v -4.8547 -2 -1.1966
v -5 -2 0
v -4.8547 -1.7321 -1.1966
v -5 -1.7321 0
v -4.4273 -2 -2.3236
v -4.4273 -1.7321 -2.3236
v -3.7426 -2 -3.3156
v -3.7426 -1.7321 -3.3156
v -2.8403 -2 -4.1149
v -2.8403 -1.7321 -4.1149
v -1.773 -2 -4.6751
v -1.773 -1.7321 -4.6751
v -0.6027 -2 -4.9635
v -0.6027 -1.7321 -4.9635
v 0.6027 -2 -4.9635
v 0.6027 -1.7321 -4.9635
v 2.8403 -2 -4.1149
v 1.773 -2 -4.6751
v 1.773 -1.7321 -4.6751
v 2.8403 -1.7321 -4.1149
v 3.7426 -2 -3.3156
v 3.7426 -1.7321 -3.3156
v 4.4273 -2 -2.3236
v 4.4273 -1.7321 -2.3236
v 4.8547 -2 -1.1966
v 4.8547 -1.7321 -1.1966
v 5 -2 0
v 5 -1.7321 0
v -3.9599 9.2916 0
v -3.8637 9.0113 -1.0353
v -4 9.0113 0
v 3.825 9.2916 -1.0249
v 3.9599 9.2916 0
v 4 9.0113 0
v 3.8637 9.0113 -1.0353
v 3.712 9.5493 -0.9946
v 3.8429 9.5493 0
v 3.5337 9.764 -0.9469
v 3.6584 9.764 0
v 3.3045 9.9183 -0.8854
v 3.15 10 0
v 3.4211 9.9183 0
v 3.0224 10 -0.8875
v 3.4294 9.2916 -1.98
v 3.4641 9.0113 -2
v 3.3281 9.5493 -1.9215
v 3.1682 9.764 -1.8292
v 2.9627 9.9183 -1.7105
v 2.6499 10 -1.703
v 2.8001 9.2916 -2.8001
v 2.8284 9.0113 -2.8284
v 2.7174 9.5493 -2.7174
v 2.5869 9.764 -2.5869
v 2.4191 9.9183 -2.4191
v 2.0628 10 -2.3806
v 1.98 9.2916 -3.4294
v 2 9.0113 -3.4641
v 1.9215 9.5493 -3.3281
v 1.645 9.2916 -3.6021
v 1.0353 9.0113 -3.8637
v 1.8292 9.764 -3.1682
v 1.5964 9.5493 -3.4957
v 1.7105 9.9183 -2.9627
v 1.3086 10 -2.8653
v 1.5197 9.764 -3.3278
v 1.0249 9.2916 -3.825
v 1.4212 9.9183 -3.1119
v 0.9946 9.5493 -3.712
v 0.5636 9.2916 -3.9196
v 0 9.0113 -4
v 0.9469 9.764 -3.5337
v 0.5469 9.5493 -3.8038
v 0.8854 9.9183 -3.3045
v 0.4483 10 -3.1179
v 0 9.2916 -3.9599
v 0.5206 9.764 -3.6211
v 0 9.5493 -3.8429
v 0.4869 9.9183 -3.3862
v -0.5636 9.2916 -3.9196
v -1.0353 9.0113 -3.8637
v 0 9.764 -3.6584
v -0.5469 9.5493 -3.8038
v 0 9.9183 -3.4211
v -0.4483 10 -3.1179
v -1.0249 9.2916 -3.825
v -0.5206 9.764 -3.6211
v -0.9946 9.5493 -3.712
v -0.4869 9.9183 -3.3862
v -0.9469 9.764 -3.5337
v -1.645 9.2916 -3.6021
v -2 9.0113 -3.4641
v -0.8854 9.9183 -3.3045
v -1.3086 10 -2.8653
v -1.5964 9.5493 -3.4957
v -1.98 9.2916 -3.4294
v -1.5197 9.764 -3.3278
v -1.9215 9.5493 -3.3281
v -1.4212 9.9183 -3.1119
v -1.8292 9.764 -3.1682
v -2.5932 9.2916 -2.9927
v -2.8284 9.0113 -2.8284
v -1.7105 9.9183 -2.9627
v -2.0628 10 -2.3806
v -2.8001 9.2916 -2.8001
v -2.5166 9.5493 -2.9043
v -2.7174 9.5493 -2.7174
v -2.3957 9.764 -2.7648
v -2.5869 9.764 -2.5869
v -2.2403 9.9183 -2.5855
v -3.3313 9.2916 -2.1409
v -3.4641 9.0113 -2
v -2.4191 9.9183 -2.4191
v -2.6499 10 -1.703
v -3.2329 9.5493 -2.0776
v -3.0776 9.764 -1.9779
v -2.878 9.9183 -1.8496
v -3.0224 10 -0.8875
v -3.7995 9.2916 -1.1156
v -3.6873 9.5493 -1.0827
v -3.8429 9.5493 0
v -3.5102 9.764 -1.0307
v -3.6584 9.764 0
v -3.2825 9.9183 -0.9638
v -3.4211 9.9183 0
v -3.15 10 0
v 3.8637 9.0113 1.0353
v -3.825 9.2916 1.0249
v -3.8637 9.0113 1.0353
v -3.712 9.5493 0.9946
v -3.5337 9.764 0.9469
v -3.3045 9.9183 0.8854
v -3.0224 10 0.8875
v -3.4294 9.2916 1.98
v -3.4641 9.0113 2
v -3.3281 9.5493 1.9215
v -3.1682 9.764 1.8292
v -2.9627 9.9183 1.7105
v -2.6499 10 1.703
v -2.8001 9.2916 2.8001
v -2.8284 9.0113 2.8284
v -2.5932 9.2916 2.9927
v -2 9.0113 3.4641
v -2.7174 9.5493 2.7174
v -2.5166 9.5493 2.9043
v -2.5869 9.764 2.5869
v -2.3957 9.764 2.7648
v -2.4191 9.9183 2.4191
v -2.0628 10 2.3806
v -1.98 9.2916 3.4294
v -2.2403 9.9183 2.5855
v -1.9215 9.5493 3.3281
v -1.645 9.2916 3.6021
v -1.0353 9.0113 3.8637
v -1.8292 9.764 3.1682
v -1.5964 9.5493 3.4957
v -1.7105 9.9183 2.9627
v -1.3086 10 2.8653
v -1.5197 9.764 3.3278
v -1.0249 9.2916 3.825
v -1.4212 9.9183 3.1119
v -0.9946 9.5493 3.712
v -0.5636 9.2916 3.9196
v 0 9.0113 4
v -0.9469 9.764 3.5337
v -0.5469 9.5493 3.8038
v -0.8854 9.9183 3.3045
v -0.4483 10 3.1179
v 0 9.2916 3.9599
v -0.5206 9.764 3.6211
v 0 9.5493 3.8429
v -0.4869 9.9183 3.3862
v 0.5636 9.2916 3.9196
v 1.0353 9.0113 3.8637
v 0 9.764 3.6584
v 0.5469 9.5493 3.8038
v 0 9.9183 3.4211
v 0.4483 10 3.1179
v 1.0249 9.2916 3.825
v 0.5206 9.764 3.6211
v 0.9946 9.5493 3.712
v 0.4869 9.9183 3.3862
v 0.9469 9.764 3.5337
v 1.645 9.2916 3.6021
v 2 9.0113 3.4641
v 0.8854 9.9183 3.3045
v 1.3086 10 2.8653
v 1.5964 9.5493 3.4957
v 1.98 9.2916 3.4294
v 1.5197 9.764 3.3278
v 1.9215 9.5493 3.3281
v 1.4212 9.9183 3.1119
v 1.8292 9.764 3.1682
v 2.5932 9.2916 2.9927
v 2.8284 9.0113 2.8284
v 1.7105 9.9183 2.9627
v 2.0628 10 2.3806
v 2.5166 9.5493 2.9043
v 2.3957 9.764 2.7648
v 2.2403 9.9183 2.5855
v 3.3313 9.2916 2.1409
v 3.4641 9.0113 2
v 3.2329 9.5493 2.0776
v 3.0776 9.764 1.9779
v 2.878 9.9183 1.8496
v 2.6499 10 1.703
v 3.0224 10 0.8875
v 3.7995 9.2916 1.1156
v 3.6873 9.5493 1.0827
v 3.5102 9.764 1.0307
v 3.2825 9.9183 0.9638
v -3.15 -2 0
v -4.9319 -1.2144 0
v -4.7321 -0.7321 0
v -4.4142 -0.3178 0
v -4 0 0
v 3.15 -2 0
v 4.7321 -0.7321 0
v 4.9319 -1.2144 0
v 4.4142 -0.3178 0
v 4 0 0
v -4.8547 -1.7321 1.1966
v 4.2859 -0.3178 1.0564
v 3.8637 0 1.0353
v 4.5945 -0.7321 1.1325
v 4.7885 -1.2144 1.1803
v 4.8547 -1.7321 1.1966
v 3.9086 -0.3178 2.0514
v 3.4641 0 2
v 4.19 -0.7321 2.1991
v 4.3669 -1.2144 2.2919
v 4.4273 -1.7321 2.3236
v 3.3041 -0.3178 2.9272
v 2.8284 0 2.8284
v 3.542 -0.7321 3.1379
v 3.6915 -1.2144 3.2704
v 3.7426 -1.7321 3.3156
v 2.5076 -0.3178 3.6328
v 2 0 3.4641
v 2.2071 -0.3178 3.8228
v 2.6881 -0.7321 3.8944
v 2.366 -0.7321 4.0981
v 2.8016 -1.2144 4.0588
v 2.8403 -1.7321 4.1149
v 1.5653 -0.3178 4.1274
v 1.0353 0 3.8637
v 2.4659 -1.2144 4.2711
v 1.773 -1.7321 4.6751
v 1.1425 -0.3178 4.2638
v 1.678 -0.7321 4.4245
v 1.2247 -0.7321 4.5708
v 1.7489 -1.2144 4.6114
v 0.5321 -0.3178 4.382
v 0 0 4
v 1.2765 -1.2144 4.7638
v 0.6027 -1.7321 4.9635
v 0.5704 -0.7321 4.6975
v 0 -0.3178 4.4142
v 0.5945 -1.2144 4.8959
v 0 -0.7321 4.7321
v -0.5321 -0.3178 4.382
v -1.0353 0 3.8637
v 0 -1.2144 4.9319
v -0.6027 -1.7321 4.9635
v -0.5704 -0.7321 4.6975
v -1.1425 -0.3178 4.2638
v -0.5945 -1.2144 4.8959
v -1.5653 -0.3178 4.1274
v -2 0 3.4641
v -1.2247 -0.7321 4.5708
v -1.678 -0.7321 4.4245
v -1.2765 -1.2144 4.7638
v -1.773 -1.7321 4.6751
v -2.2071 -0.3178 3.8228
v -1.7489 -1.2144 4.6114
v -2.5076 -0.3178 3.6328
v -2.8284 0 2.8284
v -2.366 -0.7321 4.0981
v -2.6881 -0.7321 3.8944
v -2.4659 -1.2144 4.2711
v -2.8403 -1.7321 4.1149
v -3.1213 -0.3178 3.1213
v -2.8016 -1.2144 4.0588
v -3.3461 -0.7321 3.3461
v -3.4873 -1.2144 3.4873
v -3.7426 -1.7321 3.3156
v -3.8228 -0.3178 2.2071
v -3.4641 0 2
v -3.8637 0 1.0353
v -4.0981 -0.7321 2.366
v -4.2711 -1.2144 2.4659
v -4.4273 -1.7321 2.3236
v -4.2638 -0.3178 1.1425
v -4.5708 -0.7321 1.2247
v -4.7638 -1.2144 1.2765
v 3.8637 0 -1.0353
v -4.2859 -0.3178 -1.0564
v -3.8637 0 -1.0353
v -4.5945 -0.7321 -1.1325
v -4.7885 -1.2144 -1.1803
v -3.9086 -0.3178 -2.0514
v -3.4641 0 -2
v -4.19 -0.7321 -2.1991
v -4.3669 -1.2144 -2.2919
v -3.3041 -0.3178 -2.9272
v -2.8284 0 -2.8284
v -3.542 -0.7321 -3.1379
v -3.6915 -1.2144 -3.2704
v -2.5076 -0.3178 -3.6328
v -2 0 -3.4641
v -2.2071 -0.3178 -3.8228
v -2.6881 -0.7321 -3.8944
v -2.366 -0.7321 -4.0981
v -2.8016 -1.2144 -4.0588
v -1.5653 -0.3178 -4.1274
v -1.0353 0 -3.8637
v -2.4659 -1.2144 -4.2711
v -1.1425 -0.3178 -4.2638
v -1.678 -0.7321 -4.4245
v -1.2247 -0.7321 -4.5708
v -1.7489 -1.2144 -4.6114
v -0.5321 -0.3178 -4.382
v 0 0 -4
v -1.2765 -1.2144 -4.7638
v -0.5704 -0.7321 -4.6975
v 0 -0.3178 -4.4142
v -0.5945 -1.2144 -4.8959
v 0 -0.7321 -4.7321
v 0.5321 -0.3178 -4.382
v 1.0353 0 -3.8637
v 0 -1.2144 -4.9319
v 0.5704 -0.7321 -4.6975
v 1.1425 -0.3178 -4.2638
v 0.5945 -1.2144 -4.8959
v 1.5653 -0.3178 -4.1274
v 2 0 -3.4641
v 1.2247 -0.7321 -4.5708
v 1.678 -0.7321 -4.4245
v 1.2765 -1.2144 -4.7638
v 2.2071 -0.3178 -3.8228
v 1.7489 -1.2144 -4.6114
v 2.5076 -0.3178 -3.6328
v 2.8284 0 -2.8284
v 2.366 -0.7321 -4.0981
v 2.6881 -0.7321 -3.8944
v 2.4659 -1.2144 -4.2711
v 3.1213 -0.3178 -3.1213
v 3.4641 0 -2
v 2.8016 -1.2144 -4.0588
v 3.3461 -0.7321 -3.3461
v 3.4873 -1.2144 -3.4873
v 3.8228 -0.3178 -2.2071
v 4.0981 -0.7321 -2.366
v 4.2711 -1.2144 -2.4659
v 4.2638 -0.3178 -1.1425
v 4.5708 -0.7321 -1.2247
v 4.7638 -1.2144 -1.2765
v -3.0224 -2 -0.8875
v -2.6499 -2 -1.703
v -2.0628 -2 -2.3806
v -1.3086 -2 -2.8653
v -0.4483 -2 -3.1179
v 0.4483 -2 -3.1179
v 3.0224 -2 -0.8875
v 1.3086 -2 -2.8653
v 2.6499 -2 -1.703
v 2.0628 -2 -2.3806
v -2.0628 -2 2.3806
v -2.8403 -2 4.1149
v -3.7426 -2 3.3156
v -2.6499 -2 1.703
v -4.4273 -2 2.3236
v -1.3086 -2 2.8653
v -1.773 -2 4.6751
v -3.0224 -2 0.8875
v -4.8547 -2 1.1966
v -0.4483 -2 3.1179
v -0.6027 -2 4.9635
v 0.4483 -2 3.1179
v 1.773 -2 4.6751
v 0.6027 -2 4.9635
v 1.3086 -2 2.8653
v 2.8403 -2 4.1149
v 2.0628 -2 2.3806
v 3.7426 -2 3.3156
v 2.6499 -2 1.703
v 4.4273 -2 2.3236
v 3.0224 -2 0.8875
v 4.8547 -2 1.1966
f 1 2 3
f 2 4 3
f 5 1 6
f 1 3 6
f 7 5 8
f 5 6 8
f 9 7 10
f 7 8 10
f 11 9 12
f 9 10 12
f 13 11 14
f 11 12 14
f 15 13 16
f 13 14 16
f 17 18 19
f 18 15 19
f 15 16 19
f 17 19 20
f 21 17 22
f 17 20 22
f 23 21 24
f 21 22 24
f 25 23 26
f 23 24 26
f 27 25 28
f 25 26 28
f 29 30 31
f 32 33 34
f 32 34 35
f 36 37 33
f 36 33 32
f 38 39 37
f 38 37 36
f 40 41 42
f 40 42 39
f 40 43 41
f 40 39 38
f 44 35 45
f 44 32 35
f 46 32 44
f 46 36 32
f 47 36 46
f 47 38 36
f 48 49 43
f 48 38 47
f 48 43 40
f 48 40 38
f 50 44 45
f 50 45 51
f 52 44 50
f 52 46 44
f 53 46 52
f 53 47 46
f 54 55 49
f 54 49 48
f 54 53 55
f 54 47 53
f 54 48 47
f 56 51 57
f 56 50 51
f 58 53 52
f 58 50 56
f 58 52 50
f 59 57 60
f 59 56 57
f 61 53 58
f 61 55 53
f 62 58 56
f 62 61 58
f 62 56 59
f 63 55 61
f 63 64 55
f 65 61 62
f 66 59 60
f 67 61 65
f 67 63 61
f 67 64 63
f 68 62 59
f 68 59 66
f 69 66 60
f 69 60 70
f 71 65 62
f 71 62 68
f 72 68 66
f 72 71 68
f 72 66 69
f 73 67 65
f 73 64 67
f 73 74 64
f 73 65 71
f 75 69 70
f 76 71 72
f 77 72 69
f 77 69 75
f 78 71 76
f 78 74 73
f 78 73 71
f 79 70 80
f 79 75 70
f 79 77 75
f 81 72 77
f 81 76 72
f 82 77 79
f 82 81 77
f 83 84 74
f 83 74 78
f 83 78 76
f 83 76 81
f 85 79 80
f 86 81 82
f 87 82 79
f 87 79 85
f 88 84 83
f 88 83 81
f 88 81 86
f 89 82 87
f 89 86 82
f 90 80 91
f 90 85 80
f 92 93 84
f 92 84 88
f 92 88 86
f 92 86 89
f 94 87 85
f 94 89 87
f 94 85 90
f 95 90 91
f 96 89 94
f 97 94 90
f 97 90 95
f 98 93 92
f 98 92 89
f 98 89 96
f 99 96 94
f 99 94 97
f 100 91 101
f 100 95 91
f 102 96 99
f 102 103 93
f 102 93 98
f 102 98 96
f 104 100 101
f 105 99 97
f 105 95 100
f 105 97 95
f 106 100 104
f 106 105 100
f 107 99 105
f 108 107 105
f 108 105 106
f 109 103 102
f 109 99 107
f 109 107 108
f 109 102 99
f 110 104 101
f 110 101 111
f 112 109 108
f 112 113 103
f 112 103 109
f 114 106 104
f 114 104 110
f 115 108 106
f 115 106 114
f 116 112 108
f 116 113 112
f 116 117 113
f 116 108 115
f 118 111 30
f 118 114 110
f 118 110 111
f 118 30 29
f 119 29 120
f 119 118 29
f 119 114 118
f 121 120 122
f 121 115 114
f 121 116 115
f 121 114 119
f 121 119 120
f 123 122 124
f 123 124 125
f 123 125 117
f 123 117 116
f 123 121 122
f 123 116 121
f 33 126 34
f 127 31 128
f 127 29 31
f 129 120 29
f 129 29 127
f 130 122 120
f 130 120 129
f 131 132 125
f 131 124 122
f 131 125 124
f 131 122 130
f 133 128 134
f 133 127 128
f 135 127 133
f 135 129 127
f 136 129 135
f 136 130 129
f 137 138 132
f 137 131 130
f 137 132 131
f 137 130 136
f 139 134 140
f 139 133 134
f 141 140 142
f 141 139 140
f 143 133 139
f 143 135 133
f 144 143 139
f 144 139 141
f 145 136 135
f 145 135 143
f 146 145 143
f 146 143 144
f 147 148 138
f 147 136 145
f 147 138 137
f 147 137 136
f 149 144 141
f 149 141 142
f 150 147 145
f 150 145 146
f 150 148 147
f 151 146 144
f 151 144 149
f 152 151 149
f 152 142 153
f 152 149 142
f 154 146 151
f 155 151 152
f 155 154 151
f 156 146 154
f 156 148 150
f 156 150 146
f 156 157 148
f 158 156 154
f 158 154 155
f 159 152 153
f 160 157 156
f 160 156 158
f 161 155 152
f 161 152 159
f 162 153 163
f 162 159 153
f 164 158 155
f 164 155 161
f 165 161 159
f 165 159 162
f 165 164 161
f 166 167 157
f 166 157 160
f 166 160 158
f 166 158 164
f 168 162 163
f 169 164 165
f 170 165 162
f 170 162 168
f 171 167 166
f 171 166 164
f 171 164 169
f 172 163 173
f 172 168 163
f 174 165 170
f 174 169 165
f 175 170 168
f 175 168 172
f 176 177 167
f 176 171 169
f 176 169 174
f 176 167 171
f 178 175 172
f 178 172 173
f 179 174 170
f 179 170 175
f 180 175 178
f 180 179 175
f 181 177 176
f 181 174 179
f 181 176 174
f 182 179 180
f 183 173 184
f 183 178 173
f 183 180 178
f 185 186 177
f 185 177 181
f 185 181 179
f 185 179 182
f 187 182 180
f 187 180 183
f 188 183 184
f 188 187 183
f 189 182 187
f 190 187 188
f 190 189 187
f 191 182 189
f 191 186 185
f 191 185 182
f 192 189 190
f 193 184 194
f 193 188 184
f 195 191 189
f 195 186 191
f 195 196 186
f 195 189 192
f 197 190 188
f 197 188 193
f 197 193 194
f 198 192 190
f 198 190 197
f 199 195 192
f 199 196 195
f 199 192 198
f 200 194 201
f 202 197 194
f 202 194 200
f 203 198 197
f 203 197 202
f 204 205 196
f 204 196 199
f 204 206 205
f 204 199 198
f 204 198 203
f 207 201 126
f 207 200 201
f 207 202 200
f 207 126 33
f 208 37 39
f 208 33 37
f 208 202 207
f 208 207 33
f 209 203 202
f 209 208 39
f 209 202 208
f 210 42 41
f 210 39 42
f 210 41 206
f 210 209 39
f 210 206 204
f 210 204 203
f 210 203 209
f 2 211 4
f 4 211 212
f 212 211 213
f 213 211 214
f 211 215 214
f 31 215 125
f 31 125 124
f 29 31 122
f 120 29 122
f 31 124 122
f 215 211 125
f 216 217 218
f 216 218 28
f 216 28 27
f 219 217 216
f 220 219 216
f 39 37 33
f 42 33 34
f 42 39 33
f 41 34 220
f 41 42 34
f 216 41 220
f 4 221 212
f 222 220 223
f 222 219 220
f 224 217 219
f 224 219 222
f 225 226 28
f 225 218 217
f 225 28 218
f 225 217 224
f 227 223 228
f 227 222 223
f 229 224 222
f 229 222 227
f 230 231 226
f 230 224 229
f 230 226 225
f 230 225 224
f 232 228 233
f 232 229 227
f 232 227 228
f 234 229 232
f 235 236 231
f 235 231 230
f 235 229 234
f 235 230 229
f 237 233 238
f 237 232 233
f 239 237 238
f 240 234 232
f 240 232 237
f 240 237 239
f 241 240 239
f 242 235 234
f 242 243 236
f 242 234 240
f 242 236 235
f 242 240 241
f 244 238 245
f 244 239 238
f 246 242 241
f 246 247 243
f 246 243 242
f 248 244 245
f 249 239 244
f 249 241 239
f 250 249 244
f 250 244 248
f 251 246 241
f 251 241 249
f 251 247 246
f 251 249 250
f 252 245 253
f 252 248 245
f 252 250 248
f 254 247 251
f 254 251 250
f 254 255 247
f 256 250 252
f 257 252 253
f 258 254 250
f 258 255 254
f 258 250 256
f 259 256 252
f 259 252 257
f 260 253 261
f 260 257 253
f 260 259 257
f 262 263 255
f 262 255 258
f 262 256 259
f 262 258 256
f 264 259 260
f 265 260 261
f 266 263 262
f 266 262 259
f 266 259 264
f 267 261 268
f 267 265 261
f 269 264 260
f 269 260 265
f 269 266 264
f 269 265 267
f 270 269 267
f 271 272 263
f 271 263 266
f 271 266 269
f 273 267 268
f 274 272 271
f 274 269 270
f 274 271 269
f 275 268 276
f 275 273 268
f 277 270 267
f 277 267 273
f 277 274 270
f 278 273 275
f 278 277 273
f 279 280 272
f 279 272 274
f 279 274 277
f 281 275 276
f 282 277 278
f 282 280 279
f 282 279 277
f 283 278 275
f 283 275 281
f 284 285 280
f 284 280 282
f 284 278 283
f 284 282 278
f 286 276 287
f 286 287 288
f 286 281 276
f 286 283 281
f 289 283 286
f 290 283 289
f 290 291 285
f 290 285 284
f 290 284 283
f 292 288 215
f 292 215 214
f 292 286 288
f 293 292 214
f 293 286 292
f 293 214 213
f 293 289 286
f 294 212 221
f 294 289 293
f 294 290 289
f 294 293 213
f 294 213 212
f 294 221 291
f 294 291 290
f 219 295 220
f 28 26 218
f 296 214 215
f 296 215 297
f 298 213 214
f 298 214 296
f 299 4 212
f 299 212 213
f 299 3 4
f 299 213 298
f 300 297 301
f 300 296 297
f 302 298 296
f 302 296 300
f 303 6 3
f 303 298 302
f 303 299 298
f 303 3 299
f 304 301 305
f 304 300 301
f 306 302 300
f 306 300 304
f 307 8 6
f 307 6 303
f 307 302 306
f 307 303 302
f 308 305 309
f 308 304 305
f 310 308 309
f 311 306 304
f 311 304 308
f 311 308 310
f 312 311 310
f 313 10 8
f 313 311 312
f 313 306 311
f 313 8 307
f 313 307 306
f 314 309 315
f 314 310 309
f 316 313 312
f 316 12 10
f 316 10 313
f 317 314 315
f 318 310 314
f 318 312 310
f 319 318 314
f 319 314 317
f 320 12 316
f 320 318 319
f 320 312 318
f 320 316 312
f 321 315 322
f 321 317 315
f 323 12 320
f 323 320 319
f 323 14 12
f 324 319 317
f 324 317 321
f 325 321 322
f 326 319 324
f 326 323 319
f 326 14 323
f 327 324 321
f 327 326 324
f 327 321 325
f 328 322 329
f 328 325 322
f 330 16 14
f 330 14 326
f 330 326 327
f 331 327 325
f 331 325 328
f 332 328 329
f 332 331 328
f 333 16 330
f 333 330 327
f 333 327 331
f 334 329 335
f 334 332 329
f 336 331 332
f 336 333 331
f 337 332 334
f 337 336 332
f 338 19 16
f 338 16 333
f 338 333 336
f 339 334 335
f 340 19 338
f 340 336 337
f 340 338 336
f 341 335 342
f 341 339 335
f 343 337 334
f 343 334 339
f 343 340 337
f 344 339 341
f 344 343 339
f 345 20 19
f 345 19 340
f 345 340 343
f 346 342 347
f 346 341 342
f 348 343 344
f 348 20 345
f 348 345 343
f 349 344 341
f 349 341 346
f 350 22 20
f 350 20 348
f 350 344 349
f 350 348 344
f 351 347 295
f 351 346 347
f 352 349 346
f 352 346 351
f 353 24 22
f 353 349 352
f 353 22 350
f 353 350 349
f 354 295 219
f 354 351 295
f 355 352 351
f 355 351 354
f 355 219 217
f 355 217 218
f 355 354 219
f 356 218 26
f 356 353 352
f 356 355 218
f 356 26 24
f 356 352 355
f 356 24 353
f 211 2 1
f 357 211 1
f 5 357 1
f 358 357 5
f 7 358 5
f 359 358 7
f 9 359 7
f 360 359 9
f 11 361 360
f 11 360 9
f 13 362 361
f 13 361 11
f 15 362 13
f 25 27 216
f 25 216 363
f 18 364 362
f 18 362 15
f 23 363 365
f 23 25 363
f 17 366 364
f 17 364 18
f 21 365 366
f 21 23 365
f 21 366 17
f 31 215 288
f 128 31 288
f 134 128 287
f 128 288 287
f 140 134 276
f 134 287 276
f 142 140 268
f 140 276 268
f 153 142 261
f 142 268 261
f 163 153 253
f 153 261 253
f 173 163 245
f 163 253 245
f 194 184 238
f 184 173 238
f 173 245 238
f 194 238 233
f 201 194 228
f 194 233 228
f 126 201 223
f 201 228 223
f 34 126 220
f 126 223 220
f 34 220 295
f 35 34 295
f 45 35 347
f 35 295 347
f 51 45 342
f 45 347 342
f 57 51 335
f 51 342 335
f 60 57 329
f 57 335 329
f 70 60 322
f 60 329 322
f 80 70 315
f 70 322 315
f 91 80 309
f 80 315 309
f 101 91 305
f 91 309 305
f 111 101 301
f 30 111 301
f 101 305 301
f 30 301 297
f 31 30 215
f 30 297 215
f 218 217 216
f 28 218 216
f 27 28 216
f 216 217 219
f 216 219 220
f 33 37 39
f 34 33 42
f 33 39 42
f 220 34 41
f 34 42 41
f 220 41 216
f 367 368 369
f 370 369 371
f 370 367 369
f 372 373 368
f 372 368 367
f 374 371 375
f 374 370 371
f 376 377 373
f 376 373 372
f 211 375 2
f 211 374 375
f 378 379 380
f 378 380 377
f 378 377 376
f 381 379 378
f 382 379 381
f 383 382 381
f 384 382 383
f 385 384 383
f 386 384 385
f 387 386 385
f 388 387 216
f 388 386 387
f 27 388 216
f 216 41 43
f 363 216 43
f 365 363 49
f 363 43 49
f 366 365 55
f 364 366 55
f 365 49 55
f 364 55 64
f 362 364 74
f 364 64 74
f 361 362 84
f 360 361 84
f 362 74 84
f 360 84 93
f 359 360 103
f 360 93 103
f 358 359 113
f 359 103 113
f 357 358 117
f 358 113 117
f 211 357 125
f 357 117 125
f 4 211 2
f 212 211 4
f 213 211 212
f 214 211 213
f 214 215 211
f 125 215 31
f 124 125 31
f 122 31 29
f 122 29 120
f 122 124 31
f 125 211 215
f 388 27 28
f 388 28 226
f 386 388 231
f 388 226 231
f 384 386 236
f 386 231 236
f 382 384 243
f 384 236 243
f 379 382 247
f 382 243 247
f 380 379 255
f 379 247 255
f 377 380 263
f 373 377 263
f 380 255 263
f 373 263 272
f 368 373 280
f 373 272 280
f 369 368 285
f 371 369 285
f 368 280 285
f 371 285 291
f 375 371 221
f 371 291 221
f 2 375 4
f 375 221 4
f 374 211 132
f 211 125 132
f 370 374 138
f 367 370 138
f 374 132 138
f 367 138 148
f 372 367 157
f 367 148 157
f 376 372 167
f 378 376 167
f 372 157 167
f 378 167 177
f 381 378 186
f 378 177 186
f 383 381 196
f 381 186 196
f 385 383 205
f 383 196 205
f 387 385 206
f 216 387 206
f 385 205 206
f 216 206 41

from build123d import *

# Parameters (mm, degrees)
SKETCH1_R              = 4
BOSS_EXTRUDE1_DEPTH    = 10
SKETCH6_R              = 5
BOSS_EXTRUDE2_DEPTH    = 2
SKETCH8_R              = 3.15
CUT_EXTRUDE2_DEPTH     = 14.928388277
FILLET1_R              = 2
FILLET2_R              = 1
SPLIT2_SURFACE_1_BACK  = 19.547
SPLIT2_SURFACE_1_DEPTH = 39.094
SPLIT2_SURFACE_2_BACK  = 19.547
SPLIT2_SURFACE_2_DEPTH = 39.094


with BuildPart() as part:
    # Sketch1 → Boss-Extrude1 (new body)
    with BuildSketch(Plane(origin=(0, 0, 0), x_dir=(1, 0, 0), z_dir=(0, 1, 0))):
        with Locations(Location((0, 0, 0), (0, 0, 270))):
            Circle(SKETCH1_R)
    extrude(amount=BOSS_EXTRUDE1_DEPTH)

    # Sketch6 → Boss-Extrude2 (add)
    with BuildSketch(Plane.XZ):
        with Locations(Location((0, 0, 0), (0, 0, 270))):
            Circle(SKETCH6_R)
    extrude(amount=BOSS_EXTRUDE2_DEPTH)

    # Sketch8 → Cut-Extrude2 (cut, through all)
    with BuildSketch(Plane(origin=(0, 10, 0), x_dir=(1, 0, 0), z_dir=(0, 1, 0))):
        with Locations(Location((0, 0, 0), (0, 0, 270))):
            Circle(SKETCH8_R)
    extrude(amount=-CUT_EXTRUDE2_DEPTH, mode=Mode.SUBTRACT)

    # Fillet1
    # the kernel refuses this fillet: 2 mm, written as the material it takes off along each edge
    with BuildSketch(Plane(origin=(0, 0, 0), x_dir=(0, 0, -1), z_dir=(-1, 0, 0))) as fillet1_piece_1:
        with BuildLine():
            CenterArc((3, 1.732050808), FILLET1_R, 300, 60)
            Line((4, 0), (4.02, -0.034641016))
            ThreePointArc((4.02, -0.034641016), (4.5, -0.04), (5, -0.04))
            Line((5, -0.04), (5.04, 0))
            Line((5.04, 0), (5.04, 1.732050808))
            Line((5.04, 1.732050808), (5, 1.732050808))
        make_face()
    revolve(axis=Axis((0, 0, 0), (0, -1, 0)), mode=Mode.SUBTRACT)

    # Fillet2
    # the kernel refuses this fillet: 1 mm, written as the material it takes off along each edge
    with BuildSketch(Plane(origin=(0, 10, 0), x_dir=(0, 0, 1), z_dir=(-1, 0, 0))) as fillet2_piece_1:
        with BuildLine():
            CenterArc((3, -0.988685997), FILLET2_R, 0, 81.373073441)
            Line((3.15, 0), (3.153, 0.01977372))
            ThreePointArc((3.153, 0.01977372), (3.575, 0.02), (4, 0.02))
            Line((4, 0.02), (4.02, 0))
            Line((4.02, 0), (4.02, -0.988685997))
            Line((4.02, -0.988685997), (4, -0.988685997))
        make_face()
    revolve(axis=Axis((0, 10, 0), (0, 1, 0)), mode=Mode.SUBTRACT)


with BuildPart() as body_2:
    # Split2: the piece behind the surface
    add(part.part)
    # Split2 surface: a surface, the sketch's curves swept straight by 39.094 mm
    with BuildLine(Plane(origin=(0, 10, 0), x_dir=(-1, 0, 0), z_dir=(0, -1, 0)).offset(-SPLIT2_SURFACE_1_BACK), mode=Mode.PRIVATE) as split2_surface_1_path:
        Line((-5, 0), (5, 0))
    split2_surface_1 = Shell.extrude(split2_surface_1_path.wire(), (0 * SPLIT2_SURFACE_1_DEPTH, -1 * SPLIT2_SURFACE_1_DEPTH, 0 * SPLIT2_SURFACE_1_DEPTH))
    split(bisect_by=split2_surface_1, keep=Keep.BOTTOM)


with BuildPart() as part_1:
    add(part.part)

    # Split2: split by a surface, the side it looks to stays
    # Split2 surface: a surface, the sketch's curves swept straight by 39.094 mm
    with BuildLine(Plane(origin=(0, 10, 0), x_dir=(-1, 0, 0), z_dir=(0, -1, 0)).offset(-SPLIT2_SURFACE_2_BACK), mode=Mode.PRIVATE) as split2_surface_2_path:
        Line((-5, 0), (5, 0))
    split2_surface_2 = Shell.extrude(split2_surface_2_path.wire(), (0 * SPLIT2_SURFACE_2_DEPTH, -1 * SPLIT2_SURFACE_2_DEPTH, 0 * SPLIT2_SURFACE_2_DEPTH))
    split(bisect_by=split2_surface_2, keep=Keep.TOP)


solid = Compound([body_2.part, part_1.part])
